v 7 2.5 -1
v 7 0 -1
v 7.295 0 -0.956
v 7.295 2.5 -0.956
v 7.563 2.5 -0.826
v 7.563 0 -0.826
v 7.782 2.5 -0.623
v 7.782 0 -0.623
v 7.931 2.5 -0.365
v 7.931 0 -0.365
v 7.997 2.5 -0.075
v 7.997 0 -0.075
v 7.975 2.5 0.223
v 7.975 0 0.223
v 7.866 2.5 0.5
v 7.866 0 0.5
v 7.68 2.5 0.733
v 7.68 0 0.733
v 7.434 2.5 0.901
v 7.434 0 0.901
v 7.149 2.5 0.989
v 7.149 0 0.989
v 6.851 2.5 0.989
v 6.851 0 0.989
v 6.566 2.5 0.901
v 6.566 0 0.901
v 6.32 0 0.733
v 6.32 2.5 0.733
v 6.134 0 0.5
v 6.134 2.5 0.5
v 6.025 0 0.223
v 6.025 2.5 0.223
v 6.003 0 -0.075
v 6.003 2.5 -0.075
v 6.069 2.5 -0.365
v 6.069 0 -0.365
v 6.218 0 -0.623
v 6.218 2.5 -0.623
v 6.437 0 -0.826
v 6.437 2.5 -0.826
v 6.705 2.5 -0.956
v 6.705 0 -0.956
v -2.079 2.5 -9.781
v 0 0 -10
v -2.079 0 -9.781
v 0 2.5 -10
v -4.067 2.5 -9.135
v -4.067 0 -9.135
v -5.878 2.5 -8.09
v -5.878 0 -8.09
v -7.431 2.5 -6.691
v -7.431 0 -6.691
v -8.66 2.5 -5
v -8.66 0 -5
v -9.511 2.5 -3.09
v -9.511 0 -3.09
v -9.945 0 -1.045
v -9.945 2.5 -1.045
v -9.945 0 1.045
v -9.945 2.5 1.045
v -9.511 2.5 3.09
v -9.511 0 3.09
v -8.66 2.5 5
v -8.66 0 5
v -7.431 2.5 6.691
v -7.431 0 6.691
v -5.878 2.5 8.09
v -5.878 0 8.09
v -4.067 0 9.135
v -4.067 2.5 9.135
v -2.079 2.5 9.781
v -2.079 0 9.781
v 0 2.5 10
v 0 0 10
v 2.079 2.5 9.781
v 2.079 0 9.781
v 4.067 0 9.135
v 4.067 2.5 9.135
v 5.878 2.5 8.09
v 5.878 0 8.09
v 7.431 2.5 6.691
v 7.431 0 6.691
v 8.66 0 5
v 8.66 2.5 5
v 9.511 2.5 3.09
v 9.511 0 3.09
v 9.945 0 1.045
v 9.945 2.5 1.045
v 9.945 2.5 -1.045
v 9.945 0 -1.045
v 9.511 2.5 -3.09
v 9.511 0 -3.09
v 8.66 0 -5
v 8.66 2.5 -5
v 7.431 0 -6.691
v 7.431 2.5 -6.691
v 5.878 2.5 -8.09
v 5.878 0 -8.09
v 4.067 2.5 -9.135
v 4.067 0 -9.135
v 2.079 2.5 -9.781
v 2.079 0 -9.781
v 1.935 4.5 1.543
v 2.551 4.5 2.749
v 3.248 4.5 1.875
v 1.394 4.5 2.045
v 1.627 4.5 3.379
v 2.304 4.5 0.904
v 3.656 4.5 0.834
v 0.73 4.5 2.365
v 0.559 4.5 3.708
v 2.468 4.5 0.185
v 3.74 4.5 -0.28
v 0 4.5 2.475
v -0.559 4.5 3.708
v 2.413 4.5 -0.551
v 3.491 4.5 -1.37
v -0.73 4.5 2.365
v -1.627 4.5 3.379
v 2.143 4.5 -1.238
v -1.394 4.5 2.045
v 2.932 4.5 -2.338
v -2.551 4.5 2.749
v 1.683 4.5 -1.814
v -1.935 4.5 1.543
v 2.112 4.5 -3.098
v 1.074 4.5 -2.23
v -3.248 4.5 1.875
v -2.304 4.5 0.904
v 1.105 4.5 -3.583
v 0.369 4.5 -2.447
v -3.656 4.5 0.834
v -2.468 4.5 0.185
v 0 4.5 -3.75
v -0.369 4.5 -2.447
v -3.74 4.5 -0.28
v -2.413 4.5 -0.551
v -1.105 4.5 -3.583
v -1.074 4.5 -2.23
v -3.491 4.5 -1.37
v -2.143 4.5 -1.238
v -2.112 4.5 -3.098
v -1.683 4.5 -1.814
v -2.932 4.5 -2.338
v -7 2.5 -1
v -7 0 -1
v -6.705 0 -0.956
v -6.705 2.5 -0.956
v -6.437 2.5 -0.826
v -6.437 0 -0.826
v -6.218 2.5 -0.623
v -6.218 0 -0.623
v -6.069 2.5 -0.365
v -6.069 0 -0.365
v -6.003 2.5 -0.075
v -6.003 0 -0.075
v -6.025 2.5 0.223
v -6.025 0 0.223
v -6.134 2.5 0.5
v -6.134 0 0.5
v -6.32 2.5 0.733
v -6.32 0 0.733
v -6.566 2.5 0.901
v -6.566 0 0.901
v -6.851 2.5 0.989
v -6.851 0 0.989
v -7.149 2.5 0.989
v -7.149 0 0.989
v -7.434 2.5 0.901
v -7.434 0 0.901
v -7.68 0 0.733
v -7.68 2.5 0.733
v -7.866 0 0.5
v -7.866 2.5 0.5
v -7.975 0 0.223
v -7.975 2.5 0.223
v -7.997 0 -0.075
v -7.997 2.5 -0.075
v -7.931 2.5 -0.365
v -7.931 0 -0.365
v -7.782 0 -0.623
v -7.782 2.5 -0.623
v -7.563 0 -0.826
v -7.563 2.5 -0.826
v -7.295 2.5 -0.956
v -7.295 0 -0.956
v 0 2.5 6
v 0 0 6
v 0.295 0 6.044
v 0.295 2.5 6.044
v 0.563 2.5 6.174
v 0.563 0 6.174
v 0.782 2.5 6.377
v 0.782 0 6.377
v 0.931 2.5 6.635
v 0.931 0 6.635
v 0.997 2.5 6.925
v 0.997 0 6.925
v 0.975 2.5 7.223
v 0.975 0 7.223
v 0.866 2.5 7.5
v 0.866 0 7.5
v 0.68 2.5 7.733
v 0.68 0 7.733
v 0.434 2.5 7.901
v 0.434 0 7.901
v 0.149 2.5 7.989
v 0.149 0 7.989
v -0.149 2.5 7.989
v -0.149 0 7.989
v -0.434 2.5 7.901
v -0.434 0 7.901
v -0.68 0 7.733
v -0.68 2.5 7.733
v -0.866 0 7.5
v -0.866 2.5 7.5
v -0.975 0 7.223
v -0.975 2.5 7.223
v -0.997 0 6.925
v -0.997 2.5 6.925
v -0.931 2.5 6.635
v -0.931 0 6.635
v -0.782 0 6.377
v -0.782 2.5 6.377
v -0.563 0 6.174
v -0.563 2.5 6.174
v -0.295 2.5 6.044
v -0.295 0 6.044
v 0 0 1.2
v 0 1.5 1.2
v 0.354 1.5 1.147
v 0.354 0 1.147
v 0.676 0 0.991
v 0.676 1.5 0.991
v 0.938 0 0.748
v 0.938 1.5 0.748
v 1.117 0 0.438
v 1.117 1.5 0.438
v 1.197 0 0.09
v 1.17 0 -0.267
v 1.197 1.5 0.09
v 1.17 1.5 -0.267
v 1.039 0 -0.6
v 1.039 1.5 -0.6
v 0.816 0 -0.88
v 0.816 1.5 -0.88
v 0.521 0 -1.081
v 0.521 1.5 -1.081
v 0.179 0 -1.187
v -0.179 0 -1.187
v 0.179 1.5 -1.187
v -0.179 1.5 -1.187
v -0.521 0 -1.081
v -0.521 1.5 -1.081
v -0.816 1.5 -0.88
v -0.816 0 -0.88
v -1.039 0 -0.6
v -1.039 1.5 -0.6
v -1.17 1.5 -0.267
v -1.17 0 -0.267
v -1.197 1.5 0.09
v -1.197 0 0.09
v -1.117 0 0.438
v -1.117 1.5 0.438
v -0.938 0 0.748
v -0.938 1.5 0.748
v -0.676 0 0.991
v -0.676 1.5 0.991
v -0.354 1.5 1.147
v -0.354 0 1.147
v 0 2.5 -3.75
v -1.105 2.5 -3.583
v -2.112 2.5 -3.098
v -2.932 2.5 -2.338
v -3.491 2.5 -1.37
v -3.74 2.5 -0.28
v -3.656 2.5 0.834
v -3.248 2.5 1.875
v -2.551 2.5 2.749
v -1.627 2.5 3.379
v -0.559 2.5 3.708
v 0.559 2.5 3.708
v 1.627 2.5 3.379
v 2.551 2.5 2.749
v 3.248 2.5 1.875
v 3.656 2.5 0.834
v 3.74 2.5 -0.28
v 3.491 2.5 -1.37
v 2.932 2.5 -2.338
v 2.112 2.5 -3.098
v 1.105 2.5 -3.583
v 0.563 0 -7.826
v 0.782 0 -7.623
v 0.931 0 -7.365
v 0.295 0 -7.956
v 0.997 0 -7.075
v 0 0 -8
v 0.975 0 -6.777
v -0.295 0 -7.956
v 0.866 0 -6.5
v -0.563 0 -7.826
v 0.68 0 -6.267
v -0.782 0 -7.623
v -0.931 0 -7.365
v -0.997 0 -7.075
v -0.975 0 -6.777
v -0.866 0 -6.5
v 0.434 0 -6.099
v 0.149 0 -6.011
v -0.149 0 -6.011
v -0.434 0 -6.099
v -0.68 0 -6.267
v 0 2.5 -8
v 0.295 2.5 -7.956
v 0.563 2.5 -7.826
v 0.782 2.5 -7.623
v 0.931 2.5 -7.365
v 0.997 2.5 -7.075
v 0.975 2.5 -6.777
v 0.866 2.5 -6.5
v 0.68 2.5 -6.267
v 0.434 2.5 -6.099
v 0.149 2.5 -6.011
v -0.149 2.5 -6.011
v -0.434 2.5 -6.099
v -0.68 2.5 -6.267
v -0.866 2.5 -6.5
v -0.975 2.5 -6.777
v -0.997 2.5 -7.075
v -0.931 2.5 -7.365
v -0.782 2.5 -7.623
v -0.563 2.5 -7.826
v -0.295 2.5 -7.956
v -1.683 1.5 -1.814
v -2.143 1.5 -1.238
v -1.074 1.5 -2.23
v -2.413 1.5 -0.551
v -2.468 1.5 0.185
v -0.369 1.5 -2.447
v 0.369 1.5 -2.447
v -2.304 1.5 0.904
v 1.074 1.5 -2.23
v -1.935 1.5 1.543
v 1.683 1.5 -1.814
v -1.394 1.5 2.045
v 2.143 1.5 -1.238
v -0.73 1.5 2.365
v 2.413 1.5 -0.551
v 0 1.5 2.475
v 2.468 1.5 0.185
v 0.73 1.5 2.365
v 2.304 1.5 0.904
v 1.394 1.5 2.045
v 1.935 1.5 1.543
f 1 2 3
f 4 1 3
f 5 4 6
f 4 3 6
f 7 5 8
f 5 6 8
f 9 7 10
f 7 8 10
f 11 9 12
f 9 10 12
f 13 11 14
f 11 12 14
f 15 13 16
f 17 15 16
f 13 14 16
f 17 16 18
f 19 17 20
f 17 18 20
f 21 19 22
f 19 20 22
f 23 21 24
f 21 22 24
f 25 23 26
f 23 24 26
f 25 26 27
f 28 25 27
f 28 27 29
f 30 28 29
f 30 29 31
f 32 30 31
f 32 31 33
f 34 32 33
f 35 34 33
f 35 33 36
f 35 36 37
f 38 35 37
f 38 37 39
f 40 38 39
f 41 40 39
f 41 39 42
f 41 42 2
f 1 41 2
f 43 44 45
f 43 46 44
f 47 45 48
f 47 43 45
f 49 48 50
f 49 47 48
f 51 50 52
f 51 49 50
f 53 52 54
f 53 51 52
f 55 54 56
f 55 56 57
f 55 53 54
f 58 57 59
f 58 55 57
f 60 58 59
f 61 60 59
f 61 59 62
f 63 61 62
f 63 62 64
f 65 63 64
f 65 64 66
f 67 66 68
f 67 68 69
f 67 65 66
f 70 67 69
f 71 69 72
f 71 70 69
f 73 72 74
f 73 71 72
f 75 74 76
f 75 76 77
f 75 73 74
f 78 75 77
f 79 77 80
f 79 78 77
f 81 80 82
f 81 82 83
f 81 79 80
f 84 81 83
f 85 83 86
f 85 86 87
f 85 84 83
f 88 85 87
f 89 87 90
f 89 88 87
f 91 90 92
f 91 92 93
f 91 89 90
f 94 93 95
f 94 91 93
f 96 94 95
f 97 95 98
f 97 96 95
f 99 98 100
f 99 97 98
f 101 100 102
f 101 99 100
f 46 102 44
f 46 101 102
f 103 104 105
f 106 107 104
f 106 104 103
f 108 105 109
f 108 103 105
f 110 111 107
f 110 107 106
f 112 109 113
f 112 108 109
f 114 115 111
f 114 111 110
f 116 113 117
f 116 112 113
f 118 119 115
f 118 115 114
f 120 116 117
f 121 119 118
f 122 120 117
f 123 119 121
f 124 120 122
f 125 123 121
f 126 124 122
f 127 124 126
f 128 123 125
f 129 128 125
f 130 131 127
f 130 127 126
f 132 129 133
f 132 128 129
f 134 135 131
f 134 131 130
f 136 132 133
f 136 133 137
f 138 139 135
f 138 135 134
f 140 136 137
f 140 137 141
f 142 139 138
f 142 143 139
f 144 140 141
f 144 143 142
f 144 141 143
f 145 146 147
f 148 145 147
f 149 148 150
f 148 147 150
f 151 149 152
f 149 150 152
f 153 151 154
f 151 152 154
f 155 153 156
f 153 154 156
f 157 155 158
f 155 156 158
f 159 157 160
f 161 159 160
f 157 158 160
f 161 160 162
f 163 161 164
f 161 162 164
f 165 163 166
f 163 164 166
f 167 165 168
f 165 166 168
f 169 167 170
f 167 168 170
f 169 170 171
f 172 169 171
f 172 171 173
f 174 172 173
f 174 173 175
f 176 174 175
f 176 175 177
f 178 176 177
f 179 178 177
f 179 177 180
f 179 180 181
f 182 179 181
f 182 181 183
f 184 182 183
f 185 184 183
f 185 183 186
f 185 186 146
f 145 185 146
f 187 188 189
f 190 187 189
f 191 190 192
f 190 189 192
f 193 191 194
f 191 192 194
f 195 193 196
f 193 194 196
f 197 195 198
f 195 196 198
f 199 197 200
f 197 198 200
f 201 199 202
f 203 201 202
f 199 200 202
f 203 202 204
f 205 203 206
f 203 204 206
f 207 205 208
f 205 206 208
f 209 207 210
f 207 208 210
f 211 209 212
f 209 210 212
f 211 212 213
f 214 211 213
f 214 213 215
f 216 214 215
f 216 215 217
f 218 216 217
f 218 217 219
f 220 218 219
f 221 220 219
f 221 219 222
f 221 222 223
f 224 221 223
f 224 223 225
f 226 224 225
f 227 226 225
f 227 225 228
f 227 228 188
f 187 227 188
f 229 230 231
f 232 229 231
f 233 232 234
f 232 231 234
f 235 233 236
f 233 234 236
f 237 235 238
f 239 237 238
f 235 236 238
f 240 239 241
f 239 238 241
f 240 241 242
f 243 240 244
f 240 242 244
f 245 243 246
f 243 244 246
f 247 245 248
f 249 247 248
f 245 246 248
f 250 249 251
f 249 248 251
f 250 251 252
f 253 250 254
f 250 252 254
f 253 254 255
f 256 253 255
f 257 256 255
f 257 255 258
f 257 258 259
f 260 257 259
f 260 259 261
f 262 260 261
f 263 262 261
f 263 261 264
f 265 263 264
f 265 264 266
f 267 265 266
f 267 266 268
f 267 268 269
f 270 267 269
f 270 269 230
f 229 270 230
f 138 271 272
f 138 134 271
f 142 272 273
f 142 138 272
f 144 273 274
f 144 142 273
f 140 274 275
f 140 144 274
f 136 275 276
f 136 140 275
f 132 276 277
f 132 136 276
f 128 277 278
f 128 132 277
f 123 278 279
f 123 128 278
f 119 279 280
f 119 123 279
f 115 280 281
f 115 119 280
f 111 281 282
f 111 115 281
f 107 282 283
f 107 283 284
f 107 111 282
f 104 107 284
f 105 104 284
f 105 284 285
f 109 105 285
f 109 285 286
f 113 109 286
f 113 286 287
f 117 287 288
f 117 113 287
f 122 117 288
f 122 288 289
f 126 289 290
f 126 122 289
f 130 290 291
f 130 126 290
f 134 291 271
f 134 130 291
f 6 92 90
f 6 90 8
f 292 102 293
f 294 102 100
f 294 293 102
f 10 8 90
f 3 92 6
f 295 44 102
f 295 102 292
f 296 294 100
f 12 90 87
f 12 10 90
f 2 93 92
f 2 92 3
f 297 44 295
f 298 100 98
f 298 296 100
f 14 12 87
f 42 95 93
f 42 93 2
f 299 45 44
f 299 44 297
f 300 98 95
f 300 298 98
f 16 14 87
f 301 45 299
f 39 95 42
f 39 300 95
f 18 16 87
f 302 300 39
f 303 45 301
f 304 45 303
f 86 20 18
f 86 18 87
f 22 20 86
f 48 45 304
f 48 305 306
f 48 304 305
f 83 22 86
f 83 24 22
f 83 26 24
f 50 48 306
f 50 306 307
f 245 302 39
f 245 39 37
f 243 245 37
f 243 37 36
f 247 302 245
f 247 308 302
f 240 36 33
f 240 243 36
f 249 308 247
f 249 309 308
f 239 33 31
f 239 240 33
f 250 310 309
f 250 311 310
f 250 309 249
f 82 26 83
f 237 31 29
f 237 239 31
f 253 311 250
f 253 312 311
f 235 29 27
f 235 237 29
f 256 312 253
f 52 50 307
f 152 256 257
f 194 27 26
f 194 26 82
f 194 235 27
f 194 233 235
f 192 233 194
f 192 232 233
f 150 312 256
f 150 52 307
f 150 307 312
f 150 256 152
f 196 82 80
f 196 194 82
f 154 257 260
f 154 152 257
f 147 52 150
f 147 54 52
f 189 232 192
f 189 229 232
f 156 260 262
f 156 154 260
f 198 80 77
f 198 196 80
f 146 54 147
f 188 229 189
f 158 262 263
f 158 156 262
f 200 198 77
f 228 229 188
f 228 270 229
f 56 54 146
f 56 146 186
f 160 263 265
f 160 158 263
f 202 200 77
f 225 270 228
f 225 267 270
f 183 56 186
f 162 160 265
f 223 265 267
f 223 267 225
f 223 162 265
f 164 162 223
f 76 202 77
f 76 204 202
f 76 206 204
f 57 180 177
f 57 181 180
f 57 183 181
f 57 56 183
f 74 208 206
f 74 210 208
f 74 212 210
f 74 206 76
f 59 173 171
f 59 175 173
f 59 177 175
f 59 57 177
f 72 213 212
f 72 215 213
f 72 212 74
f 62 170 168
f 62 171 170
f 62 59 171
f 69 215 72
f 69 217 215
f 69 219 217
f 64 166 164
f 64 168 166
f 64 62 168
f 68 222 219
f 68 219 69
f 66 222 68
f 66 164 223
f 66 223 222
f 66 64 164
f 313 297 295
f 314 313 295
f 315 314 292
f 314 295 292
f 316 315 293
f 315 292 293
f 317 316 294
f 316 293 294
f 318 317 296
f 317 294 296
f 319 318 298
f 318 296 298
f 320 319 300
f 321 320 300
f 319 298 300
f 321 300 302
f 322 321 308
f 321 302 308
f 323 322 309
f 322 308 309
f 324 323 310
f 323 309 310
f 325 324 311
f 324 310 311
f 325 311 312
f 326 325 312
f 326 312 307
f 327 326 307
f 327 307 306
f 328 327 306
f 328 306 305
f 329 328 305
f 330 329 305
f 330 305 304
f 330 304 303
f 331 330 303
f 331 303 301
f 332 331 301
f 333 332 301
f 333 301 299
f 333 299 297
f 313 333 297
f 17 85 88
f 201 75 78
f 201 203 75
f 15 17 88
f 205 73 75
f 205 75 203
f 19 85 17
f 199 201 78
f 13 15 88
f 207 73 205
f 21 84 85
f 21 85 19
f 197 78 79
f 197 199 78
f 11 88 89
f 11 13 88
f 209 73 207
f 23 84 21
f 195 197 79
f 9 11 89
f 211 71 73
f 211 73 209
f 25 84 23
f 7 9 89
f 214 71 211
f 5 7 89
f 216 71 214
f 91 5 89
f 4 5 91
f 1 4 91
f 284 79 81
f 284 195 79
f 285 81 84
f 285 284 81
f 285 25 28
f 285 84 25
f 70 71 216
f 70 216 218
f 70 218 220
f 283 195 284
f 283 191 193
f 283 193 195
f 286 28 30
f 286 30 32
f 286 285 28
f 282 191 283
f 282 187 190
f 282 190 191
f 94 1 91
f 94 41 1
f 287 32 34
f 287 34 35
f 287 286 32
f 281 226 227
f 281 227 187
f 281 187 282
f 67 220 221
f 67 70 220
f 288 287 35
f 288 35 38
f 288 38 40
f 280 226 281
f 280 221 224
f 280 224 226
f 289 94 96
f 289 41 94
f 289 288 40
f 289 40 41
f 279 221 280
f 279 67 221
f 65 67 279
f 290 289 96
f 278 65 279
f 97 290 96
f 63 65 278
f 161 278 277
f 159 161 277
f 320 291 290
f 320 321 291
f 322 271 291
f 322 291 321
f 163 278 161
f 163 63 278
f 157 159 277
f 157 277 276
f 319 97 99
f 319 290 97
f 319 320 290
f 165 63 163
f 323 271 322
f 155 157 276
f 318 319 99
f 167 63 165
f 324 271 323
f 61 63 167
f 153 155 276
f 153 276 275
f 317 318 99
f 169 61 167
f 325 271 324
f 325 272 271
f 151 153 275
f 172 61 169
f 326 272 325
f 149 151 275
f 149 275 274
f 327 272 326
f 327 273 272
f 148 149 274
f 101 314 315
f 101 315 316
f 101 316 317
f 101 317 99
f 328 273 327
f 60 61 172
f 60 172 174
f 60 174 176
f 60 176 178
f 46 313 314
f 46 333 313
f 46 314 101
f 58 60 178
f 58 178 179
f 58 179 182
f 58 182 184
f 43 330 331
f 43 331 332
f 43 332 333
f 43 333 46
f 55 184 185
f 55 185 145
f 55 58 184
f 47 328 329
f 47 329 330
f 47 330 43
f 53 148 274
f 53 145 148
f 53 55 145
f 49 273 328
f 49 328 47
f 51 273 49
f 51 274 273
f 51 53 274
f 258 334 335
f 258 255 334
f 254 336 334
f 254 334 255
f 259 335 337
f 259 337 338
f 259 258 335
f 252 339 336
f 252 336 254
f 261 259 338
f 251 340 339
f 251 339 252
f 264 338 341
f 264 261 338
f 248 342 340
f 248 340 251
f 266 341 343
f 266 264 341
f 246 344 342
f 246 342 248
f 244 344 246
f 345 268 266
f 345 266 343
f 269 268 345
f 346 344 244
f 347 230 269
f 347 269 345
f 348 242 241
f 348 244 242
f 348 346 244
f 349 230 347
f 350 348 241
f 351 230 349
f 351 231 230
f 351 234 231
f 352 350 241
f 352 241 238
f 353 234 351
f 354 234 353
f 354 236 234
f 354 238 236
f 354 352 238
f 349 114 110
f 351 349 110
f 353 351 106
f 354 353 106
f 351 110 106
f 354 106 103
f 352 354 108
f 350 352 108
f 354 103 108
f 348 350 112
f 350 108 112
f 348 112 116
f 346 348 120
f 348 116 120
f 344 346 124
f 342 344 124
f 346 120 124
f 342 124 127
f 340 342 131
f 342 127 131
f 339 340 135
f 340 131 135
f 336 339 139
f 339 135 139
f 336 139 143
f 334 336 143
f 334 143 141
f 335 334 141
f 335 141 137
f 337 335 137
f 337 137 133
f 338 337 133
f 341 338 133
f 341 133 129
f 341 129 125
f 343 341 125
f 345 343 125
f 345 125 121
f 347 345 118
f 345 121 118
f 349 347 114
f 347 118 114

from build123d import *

# Parameters (mm, degrees)
SKETCH_2_R          = 1.2
CUT_EXTRUDE_1_DEPTH = 10
SKETCH_3_R          = 2.475
CUT_EXTRUDE_2_DEPTH = 3
SKETCH_4_R          = 1
CUT_EXTRUDE_3_DEPTH = 3


with BuildPart() as part:
    # 草图1 → 旋转1 (revolve)
    with BuildSketch(Plane.XY, mode=Mode.PRIVATE) as revolve_1_sk:
        Polygon((0, 0), (10, 0), (10, 2.5), (3.75, 2.5), (3.75, 4.5), (0, 4.5), align=None)
    revolve(revolve_1_sk.sketch.rotate(Axis((0, 0, 0), (0, 1, 0)), 90), axis=Axis((0, 0, 0), (0, 1, 0)))

    # 草图2 → 切除-拉伸1 (cut)
    with BuildSketch(Plane(origin=(0, 4.5, 0), x_dir=(1, 0, 0), z_dir=(0, 1, 0))):
        with Locations(Location((0, 0, 0), (0, 0, 270))):
            Circle(SKETCH_2_R)
    extrude(amount=-CUT_EXTRUDE_1_DEPTH, mode=Mode.SUBTRACT)

    # 草图3 → 切除-拉伸2 (cut)
    with BuildSketch(Plane(origin=(0, 4.5, 0), x_dir=(1, 0, 0), z_dir=(0, 1, 0))):
        with Locations(Location((0, 0, 0), (0, 0, 270))):
            Circle(SKETCH_3_R)
    extrude(amount=-CUT_EXTRUDE_2_DEPTH, mode=Mode.SUBTRACT)

    # 草图4 → 切除-拉伸3 (cut)
    with BuildSketch(Plane.XZ):
        with Locations(Location((7, 0, 0), (0, 0, 270))):
            Circle(SKETCH_4_R)
        with Locations(Location((0, -7, 0), (0, 0, 270))):
            Circle(SKETCH_4_R)
        with Locations(Location((-7, 0, 0), (0, 0, 270))):
            Circle(SKETCH_4_R)
        with Locations(Location((0, 7, 0), (0, 0, 270))):
            Circle(SKETCH_4_R)
    extrude(amount=-CUT_EXTRUDE_3_DEPTH, mode=Mode.SUBTRACT)


solid = part.part
